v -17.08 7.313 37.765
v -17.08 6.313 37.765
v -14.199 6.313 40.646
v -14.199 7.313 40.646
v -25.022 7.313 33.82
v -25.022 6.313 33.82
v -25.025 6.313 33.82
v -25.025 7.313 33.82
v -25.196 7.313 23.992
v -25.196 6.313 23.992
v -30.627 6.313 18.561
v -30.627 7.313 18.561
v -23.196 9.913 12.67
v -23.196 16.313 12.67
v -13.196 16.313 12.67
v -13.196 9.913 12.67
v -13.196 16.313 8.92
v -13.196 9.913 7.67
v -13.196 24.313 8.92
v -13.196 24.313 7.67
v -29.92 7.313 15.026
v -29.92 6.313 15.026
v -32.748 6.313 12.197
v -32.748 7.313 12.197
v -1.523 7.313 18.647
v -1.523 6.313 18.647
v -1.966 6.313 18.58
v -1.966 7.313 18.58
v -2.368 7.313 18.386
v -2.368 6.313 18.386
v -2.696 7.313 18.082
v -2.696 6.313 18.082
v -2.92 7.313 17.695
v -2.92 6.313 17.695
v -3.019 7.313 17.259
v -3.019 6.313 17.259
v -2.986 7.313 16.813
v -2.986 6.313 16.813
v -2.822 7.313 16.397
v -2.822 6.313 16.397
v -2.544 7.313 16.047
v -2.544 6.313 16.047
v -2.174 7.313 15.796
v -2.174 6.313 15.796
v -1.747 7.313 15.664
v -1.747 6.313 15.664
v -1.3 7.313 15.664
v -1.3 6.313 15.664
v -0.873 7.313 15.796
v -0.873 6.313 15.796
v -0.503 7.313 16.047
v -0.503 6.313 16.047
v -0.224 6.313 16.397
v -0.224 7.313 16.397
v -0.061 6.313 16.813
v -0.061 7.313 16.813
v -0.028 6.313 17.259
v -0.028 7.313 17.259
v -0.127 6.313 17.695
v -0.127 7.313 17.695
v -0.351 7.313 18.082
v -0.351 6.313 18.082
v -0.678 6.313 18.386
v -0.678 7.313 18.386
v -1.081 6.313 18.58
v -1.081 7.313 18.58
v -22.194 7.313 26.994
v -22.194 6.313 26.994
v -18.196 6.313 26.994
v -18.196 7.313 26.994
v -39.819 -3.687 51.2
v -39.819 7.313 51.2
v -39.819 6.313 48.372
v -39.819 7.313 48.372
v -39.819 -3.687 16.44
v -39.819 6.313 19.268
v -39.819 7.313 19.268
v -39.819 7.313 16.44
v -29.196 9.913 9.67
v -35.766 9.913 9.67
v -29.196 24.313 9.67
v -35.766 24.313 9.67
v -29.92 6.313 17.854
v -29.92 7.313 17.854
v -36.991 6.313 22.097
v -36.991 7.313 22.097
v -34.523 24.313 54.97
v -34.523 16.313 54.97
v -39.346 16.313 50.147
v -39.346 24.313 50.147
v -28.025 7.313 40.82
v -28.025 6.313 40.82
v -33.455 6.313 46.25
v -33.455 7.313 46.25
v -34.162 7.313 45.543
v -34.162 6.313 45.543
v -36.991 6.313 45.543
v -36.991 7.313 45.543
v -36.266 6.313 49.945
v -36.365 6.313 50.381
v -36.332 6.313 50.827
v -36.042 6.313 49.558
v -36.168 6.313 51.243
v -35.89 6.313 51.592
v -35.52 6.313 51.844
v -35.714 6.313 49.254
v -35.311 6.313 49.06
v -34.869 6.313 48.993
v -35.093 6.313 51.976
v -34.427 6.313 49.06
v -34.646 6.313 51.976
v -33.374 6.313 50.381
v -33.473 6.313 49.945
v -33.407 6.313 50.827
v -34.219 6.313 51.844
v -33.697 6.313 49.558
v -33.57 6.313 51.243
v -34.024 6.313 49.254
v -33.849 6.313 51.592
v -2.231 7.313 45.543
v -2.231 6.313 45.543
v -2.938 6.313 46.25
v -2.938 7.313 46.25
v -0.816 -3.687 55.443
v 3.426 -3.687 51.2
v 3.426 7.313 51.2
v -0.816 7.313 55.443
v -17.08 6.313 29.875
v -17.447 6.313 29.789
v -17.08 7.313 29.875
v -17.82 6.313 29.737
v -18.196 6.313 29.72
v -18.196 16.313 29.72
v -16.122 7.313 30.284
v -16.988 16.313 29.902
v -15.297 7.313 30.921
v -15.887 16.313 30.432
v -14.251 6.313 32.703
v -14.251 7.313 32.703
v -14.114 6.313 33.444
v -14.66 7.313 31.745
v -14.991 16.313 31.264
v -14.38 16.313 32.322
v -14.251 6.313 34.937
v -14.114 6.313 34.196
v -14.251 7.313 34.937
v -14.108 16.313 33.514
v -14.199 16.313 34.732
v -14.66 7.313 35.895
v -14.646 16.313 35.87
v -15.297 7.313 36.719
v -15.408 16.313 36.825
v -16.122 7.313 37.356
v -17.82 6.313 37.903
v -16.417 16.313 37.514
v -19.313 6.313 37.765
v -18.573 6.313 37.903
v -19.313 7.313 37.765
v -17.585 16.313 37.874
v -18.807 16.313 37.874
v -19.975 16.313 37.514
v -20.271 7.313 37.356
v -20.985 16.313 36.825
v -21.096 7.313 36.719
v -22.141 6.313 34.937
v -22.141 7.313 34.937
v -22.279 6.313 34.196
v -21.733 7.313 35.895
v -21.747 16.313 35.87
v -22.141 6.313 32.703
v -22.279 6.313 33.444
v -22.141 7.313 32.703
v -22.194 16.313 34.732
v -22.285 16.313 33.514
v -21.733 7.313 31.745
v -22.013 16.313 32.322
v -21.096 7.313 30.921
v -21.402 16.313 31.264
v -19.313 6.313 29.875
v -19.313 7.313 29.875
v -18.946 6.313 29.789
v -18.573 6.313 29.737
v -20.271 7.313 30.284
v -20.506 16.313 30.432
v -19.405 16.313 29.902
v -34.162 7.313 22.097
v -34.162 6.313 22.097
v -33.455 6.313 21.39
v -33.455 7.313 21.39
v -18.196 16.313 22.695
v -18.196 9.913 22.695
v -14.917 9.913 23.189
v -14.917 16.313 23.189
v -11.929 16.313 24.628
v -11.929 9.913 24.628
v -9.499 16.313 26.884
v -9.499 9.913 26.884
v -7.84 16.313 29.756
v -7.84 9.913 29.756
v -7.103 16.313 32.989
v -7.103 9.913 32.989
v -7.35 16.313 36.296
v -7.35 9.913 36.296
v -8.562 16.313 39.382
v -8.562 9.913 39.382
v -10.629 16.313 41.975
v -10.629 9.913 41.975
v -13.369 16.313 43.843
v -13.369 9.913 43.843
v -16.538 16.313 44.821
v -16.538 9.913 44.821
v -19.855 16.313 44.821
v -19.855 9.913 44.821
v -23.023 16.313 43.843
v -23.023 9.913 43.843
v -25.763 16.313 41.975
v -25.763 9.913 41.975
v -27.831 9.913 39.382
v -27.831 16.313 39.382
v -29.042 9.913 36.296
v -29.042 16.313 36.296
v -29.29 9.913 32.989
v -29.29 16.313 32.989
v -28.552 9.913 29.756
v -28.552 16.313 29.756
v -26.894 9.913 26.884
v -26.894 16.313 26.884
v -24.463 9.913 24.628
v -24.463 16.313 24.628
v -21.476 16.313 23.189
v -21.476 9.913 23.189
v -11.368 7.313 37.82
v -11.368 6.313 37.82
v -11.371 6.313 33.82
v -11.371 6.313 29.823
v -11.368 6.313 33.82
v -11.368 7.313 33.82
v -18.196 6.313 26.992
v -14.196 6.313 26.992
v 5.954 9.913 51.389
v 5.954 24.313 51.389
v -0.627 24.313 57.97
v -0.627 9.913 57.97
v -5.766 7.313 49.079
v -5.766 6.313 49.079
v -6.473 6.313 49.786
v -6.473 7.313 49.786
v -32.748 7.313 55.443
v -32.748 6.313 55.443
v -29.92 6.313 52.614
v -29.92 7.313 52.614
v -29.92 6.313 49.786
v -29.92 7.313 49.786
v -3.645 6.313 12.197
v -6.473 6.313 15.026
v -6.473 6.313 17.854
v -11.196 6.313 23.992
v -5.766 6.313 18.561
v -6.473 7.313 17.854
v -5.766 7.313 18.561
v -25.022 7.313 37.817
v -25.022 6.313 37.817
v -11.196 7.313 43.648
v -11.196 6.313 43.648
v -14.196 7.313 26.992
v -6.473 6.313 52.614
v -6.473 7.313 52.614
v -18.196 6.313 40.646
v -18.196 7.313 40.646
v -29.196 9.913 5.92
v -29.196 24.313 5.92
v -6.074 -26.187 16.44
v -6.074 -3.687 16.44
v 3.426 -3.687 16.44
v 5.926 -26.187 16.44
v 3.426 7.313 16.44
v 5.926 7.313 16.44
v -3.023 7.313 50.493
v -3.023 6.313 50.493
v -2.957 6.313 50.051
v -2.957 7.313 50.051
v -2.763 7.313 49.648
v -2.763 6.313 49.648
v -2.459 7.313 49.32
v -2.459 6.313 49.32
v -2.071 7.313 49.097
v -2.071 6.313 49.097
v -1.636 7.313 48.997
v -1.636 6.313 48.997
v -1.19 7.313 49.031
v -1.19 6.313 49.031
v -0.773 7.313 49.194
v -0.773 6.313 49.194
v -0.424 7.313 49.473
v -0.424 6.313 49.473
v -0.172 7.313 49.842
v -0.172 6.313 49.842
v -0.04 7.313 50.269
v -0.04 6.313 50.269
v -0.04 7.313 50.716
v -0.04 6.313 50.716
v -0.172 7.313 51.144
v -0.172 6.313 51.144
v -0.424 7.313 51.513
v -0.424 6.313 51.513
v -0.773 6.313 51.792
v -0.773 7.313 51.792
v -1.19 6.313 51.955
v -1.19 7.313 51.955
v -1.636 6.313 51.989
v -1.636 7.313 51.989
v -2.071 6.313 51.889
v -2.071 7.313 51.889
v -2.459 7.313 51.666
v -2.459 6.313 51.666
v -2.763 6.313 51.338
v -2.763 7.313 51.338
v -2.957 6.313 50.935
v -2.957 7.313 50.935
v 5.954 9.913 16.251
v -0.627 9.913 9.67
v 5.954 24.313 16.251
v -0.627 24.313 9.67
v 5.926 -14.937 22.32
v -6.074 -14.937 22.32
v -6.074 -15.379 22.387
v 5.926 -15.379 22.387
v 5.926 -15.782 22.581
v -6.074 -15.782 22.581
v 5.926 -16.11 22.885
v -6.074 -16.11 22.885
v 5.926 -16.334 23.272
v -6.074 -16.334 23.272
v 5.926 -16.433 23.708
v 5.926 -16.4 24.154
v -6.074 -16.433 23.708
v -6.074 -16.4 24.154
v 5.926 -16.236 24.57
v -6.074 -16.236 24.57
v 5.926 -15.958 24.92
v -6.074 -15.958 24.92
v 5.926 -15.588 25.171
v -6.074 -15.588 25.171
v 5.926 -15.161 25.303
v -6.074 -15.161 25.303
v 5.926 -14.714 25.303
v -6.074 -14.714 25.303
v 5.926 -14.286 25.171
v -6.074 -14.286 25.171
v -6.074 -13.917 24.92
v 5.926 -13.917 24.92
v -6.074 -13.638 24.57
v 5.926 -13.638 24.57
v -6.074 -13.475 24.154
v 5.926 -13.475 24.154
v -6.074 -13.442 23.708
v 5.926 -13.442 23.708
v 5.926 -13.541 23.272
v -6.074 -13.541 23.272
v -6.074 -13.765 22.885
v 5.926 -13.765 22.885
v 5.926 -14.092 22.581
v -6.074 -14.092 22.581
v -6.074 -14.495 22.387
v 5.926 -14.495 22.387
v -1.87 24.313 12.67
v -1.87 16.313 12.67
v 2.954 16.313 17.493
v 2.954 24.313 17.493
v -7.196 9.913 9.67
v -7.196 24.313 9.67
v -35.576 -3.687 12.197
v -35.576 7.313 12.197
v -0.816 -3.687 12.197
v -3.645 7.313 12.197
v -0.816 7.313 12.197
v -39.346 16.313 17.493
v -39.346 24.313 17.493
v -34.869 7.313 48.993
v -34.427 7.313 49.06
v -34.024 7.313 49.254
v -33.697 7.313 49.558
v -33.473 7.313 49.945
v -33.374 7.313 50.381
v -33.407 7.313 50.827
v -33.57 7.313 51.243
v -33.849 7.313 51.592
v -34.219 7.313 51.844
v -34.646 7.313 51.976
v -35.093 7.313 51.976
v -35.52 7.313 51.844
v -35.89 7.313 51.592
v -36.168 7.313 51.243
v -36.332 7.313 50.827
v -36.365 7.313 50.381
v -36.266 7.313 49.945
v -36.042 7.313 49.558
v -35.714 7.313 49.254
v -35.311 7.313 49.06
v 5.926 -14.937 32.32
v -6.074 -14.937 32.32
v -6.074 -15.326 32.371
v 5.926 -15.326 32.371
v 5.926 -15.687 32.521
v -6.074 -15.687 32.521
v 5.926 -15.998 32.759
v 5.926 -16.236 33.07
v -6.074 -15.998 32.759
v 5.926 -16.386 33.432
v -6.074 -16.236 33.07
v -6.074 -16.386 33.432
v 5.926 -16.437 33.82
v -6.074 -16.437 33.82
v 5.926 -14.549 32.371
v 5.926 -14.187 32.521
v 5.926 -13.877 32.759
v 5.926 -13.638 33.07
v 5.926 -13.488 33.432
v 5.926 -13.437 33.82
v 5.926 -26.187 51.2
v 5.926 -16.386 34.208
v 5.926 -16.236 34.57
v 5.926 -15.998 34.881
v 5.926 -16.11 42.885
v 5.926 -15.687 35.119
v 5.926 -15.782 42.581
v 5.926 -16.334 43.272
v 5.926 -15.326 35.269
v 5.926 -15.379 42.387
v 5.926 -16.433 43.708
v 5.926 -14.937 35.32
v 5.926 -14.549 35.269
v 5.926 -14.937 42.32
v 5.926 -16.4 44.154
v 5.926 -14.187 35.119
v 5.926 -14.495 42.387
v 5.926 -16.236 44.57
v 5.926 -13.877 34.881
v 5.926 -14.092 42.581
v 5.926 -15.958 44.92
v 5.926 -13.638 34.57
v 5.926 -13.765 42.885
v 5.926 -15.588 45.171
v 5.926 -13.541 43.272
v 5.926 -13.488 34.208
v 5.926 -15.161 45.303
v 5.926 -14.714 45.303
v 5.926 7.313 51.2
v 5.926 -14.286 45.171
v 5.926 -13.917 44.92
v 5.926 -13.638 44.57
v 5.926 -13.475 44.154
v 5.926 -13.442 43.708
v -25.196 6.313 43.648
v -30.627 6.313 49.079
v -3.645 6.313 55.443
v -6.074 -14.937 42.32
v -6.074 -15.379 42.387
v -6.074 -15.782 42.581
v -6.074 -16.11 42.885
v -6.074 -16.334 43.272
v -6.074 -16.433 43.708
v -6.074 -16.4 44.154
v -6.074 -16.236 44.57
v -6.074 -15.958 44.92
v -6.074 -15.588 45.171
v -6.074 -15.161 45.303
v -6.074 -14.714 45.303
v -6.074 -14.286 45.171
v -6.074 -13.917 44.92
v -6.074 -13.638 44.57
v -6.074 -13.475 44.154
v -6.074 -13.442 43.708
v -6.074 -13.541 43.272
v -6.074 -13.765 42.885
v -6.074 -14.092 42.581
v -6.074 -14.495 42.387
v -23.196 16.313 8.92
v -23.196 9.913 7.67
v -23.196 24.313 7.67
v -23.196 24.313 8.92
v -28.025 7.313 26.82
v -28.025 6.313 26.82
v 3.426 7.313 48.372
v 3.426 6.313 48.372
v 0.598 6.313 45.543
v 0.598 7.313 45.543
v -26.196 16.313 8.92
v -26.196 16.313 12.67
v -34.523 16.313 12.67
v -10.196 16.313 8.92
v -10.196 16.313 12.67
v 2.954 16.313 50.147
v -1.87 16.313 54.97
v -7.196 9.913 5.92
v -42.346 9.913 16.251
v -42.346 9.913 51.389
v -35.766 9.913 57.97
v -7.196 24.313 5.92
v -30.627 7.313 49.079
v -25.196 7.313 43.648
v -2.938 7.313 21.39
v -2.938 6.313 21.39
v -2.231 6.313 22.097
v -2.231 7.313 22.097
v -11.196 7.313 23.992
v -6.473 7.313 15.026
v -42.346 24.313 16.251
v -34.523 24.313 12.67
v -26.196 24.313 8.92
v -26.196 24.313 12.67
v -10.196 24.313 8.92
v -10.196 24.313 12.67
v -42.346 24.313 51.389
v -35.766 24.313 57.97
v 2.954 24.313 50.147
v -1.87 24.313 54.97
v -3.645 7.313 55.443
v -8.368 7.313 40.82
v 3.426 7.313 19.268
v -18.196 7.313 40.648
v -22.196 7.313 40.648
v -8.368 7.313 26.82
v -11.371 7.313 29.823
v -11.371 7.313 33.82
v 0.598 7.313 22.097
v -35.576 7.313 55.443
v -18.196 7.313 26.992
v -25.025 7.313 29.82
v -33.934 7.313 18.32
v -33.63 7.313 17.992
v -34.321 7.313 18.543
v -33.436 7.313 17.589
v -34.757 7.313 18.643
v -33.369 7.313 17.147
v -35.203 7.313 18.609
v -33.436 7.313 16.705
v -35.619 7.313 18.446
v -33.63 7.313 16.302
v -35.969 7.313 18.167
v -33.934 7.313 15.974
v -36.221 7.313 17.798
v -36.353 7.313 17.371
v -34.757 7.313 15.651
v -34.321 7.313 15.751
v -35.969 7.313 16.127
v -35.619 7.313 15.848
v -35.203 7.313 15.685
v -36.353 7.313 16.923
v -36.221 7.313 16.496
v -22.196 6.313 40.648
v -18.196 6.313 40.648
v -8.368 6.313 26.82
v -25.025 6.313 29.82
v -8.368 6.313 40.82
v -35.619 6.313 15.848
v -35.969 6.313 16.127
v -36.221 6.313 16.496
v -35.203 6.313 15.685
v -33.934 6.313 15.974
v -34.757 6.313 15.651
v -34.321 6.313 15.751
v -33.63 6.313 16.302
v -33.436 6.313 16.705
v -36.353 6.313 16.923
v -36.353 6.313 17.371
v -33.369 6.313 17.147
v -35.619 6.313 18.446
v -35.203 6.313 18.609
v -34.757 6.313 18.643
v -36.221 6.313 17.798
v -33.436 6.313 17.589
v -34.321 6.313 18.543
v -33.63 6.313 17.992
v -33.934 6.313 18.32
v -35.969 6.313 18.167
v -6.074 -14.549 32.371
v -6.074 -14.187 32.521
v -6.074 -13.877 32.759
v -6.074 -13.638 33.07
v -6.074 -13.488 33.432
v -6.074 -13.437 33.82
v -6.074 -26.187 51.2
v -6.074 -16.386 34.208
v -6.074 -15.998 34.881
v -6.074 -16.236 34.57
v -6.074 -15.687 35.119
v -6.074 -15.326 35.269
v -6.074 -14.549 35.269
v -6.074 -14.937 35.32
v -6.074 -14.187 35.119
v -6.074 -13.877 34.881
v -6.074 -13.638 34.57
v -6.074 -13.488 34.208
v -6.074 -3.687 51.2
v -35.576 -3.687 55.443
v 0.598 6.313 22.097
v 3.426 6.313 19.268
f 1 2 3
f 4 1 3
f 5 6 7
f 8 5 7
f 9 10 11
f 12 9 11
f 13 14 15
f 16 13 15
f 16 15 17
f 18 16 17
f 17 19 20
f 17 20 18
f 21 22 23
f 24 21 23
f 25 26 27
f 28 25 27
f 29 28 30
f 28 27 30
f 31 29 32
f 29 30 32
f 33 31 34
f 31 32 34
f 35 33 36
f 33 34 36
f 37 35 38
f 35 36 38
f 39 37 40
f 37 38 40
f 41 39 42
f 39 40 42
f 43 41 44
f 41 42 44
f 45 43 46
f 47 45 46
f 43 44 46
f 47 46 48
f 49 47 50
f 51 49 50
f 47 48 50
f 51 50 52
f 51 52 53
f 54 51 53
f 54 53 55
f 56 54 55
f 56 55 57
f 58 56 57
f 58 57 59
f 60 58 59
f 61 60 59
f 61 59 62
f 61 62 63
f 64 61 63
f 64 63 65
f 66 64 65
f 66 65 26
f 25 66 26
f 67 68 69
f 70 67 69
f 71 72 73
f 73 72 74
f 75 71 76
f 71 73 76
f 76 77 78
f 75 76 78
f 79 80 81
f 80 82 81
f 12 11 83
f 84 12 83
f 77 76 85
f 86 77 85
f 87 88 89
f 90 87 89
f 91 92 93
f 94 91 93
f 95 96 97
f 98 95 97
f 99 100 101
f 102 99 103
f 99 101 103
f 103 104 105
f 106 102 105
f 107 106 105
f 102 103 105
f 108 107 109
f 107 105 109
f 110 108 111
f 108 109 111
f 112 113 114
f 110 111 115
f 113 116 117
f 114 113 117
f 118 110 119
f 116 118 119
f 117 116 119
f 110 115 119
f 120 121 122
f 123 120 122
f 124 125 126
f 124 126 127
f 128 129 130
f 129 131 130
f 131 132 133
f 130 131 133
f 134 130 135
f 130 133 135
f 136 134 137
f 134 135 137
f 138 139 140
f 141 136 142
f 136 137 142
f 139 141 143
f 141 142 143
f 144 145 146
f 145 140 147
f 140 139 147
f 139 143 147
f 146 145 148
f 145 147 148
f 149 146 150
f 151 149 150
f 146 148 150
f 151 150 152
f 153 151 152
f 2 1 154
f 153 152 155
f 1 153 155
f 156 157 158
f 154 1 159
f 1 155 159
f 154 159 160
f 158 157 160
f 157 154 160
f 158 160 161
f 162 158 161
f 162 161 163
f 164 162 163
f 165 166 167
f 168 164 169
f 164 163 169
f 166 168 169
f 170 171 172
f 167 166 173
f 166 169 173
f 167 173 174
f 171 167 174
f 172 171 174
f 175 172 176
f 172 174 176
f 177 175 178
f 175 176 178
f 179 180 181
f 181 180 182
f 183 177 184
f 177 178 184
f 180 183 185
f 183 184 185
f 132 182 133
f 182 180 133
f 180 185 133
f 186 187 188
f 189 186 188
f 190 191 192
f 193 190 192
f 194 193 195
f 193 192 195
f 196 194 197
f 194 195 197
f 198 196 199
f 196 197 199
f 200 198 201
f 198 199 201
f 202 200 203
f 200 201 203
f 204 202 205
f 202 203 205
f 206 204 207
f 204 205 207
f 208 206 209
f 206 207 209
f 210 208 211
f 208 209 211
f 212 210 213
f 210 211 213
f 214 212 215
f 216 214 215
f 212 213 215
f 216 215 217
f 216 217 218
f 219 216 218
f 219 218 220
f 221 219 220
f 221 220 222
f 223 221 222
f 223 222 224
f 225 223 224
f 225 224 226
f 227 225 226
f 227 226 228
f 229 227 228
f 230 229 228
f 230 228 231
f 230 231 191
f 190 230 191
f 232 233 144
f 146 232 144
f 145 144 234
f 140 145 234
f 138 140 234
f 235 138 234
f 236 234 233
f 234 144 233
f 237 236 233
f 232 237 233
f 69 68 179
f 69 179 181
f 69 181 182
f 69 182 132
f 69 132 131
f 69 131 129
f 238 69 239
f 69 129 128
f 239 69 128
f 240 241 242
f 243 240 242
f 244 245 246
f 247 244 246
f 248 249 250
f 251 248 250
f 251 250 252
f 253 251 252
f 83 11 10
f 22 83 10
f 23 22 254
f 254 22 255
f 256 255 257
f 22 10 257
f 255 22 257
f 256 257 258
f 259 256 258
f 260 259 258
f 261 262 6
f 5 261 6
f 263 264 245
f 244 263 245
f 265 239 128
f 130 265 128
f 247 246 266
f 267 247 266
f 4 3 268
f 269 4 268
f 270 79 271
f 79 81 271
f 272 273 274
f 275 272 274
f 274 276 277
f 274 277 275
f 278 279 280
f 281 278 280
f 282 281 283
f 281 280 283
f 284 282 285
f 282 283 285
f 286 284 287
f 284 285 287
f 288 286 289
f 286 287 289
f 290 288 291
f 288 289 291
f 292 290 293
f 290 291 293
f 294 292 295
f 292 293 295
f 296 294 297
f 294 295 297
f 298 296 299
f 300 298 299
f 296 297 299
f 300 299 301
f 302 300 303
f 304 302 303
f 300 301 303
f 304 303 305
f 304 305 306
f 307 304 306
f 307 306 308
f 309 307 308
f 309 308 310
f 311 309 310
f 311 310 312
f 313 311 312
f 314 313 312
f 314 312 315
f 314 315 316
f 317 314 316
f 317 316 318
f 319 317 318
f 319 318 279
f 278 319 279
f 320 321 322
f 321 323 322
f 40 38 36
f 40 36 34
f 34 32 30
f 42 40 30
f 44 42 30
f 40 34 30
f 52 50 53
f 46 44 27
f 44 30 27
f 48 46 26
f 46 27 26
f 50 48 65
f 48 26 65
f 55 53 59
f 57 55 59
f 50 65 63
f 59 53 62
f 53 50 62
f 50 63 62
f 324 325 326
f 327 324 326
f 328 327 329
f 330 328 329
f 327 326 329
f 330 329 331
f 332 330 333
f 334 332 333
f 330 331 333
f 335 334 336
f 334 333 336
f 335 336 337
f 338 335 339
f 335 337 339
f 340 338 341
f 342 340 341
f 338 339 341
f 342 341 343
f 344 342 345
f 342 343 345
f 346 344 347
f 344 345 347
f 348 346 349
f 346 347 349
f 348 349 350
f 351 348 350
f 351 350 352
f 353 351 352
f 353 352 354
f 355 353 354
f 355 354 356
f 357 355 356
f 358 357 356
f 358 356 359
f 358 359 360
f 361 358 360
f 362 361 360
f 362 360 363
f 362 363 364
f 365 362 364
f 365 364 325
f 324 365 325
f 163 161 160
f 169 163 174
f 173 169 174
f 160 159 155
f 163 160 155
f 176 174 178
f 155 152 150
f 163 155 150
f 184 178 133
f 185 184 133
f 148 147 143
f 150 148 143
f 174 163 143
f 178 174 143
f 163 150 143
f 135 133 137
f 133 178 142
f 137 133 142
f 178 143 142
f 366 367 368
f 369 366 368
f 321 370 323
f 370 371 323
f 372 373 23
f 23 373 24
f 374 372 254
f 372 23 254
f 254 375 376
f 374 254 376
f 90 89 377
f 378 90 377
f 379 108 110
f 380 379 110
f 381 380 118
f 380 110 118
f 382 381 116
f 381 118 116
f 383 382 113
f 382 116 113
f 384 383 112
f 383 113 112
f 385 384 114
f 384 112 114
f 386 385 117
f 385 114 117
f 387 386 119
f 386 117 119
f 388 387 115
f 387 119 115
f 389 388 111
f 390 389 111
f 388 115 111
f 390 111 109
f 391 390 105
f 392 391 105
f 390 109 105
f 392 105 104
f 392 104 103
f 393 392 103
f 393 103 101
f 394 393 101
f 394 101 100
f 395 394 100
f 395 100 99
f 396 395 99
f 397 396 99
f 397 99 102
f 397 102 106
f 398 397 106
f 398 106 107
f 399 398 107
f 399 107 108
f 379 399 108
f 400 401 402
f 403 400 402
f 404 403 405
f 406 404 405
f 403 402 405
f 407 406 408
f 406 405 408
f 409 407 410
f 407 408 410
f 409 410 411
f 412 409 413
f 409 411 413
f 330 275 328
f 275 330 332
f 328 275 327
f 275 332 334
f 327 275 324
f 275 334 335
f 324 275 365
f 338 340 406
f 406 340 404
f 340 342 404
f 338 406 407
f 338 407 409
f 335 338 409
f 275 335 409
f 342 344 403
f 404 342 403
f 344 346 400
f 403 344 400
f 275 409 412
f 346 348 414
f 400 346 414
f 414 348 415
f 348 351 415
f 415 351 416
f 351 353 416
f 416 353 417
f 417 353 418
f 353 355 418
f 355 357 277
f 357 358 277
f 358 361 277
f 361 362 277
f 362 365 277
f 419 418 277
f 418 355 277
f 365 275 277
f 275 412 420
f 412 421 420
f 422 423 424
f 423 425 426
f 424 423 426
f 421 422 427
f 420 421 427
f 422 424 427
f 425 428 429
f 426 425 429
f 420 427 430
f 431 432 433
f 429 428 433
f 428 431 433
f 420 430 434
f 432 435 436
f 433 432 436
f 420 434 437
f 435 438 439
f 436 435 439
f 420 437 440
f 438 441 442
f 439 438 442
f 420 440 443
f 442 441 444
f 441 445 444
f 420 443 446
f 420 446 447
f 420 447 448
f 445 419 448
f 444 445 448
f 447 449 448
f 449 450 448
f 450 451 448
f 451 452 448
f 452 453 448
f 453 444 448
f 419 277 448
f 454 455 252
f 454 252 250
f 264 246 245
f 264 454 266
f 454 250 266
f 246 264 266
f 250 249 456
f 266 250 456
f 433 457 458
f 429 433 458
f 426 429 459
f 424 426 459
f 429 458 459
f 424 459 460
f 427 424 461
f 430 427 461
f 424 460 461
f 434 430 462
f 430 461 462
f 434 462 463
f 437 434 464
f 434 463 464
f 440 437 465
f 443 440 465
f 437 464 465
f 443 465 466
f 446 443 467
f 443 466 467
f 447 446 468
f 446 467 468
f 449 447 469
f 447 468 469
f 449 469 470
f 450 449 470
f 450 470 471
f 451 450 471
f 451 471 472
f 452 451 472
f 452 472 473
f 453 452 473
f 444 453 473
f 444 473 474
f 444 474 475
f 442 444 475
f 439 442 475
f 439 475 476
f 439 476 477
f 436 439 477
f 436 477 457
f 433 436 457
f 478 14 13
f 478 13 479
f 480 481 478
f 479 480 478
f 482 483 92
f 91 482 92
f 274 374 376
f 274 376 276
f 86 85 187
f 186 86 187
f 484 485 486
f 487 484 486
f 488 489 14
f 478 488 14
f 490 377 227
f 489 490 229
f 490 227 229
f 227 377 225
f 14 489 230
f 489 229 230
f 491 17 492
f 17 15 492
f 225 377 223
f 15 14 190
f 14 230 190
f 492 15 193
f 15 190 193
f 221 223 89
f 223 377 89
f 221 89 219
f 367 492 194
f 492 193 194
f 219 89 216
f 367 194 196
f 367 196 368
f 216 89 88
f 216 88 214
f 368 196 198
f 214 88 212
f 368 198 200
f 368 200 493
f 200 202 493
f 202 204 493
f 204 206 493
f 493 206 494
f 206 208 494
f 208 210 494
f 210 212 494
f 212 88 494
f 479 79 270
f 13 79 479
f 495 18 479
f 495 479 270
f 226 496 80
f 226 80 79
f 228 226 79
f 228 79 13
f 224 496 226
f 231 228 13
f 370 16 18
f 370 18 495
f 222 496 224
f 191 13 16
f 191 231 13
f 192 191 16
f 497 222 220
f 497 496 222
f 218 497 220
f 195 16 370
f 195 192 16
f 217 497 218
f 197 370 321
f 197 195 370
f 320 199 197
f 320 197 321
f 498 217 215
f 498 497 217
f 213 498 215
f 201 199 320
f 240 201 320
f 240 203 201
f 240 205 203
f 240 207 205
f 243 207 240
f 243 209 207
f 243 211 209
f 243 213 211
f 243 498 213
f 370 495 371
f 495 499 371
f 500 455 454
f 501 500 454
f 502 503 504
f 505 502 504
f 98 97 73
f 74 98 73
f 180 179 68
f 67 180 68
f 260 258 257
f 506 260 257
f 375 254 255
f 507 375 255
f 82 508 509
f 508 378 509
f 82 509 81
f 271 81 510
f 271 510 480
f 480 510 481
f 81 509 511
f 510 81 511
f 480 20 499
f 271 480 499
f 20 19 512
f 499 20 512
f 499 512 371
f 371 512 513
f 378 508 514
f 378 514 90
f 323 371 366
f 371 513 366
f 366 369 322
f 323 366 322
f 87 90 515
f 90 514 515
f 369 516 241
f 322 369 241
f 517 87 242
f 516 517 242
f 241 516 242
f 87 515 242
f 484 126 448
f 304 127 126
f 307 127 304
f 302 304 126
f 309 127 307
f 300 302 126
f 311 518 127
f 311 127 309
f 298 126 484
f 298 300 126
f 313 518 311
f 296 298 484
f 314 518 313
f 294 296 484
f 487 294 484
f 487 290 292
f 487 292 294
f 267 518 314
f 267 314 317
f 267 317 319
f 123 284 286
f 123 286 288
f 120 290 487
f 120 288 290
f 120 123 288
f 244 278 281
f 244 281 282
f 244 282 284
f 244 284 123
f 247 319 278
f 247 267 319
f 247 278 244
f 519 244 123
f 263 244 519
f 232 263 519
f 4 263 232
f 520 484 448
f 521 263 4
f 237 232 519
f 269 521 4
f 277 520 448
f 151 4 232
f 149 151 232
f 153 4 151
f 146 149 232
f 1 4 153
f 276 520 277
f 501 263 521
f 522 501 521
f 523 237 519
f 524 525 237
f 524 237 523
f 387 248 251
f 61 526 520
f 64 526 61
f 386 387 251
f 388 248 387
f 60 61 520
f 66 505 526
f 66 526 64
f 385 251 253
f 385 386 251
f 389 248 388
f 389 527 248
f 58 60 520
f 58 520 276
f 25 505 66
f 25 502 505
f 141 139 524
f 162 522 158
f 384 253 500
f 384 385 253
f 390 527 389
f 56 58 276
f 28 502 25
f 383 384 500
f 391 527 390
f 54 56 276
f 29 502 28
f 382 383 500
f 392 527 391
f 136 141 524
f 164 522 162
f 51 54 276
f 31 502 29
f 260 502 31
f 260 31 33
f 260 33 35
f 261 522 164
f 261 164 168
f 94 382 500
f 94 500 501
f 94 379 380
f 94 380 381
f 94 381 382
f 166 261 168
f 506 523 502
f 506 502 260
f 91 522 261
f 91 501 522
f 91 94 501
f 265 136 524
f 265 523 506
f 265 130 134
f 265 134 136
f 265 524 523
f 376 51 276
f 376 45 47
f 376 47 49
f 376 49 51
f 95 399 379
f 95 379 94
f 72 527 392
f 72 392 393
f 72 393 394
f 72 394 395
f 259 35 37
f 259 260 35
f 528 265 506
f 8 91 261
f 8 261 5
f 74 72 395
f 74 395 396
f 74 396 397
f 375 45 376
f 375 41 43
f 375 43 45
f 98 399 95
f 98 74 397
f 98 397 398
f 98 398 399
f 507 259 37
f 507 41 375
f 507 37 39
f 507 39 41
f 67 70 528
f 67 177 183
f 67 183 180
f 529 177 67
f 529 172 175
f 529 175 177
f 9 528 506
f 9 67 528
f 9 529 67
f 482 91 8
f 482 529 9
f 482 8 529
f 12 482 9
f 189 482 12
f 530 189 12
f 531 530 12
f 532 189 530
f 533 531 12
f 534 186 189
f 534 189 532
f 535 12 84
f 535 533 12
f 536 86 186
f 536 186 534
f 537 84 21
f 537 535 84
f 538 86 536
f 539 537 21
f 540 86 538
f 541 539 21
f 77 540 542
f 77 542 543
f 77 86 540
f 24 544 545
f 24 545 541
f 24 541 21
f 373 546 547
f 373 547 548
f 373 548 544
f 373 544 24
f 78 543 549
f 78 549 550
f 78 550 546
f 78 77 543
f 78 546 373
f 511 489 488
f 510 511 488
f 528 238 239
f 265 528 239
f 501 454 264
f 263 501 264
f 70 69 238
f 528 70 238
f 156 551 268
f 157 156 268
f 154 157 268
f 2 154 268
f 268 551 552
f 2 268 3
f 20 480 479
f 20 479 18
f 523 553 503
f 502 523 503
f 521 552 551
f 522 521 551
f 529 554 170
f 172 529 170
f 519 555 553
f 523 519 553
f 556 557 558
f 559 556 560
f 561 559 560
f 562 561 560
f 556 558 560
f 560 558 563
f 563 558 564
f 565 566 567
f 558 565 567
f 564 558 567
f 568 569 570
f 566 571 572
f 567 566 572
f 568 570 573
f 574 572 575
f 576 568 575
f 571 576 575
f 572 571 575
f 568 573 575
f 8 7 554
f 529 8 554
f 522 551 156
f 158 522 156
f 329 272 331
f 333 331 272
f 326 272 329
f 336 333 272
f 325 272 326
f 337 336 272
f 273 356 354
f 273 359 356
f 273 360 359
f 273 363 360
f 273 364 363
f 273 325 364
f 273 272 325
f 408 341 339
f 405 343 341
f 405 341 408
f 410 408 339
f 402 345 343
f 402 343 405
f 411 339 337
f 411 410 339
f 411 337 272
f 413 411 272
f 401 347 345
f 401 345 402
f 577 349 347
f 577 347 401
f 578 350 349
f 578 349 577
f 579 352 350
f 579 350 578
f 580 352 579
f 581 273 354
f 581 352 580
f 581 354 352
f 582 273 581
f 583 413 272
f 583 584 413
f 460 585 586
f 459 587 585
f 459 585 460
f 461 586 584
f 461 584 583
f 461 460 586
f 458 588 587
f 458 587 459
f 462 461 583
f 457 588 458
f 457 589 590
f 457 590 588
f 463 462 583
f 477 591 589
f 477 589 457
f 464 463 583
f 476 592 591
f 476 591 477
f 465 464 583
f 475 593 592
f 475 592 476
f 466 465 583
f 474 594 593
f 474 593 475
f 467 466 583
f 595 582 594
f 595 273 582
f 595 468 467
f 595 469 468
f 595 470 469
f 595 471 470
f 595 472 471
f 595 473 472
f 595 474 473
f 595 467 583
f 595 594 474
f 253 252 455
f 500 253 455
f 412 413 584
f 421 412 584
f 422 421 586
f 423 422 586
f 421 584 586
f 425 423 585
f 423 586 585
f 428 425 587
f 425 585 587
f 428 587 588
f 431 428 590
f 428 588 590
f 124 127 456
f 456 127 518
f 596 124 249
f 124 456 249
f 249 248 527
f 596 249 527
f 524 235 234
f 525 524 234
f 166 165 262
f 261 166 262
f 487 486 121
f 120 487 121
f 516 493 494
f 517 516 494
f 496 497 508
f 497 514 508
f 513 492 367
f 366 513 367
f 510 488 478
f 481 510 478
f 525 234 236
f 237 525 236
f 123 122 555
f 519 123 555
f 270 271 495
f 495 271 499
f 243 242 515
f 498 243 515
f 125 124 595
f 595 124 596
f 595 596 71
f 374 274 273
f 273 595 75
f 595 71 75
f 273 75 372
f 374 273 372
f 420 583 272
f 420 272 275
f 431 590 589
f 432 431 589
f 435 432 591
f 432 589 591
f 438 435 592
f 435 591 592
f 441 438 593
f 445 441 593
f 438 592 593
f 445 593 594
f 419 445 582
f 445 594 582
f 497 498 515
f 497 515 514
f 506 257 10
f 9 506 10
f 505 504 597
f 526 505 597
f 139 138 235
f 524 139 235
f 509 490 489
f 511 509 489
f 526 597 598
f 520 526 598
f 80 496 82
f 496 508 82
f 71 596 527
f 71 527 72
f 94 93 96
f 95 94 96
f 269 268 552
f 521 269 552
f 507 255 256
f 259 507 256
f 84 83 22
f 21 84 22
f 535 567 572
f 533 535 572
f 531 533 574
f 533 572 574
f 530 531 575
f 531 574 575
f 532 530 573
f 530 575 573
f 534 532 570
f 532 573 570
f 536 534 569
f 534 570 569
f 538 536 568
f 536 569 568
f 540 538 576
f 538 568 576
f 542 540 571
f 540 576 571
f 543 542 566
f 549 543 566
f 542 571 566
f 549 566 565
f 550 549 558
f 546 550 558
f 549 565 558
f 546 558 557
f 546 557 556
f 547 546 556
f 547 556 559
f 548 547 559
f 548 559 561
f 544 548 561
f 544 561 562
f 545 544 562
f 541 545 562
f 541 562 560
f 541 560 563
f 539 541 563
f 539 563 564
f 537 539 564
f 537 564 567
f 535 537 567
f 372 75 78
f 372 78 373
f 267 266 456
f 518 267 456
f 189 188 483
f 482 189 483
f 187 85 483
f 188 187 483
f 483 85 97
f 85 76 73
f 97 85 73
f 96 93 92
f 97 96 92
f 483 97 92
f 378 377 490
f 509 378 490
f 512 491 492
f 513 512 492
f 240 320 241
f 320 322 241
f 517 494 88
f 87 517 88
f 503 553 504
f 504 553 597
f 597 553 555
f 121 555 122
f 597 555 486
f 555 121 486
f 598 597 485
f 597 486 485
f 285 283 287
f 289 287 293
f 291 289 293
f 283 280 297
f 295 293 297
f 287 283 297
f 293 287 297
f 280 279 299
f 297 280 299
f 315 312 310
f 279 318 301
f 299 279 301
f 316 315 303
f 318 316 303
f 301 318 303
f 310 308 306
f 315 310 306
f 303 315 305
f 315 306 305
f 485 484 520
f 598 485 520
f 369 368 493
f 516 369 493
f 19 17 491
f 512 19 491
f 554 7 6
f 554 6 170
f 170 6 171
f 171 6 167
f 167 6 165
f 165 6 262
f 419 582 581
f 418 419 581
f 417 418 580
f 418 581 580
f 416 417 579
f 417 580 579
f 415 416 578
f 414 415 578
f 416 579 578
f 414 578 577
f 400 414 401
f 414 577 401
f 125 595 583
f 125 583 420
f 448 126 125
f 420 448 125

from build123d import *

# Parameters (mm, degrees)
BOSS_EXTRUDE1_DEPTH      = 8
BOSS_EXTRUDE2_DEPTH      = 6.4
SKETCH4_R                = 11.125
CUT_EXTRUDE1_DEPTH       = 13
SKETCH5_R                = 4.1
BOSS_EXTRUDE3_DEPTH      = 13
SKETCH6_R                = 1.5
BOSS_EXTRUDE4_DEPTH      = 4
CIRPATTERN2_COUNT        = 4
SKETCH8_W                = 10
SKETCH8_H                = 5
CUT_EXTRUDE2_DEPTH       = 19
BOSS_EXTRUDE5_DEPTH      = 7
BOSS_EXTRUDE5_DEPTH_BACK = 3
SKETCH10_W               = 34.760105104
SKETCH10_H               = 11
BOSS_EXTRUDE6_DEPTH      = 2.5
SKETCH11_W               = 12
SKETCH11_H               = 34.760105104
BOSS_EXTRUDE7_DEPTH      = 22.5
CUT_EXTRUDE3_DEPTH       = 22.5


with BuildPart() as part:
    # Sketch1 → Boss-Extrude1 (new body)
    with BuildSketch(Plane.XZ.offset(-16.312689454)):
        Polygon((-42.346407377, 51.389271206), (-42.346407377, 16.250671026), (-35.765707467, 9.669971116), (-29.196407377, 9.669971116), (-29.196407377, 5.919971116), (-7.196407377, 5.919971116), (-7.196407377, 9.669971116), (-0.627107287, 9.669971116), (5.953592623, 16.250671026), (5.953592623, 51.389271206), (-0.627107287, 57.969971116), (-35.765707467, 57.969971116), align=None)
        Polygon((-10.196407377, 12.669971116), (-1.869747974, 12.669971116), (2.953592623, 17.493311713), (2.953592623, 50.146630519), (-1.869747974, 54.969971116), (-34.52306678, 54.969971116), (-39.346407377, 50.146630519), (-39.346407377, 17.493311713), (-34.52306678, 12.669971116), (-26.196407377, 12.669971116), (-26.196407377, 8.919971116), (-10.196407377, 8.919971116), align=None, mode=Mode.SUBTRACT)
    extrude(amount=-BOSS_EXTRUDE1_DEPTH)

    # Sketch3 → Boss-Extrude2 (add)
    with BuildSketch(Plane.XZ.offset(-16.312689454)):
        Polygon((-35.765707467, 57.969971116), (-42.346407377, 51.389271206), (-42.346407377, 16.250671026), (-35.765707467, 9.669971116), (-29.196407377, 9.669971116), (-29.196407377, 5.919971116), (-7.196407377, 5.919971116), (-7.196407377, 9.669971116), (-0.627107287, 9.669971116), (5.953592623, 16.250671026), (5.953592623, 51.389271206), (-0.627107287, 57.969971116), align=None)
    extrude(amount=BOSS_EXTRUDE2_DEPTH)

    # Sketch4 → Cut-Extrude1 (cut)
    with BuildSketch(Plane.XZ.offset(-9.912689454)):
        with Locations(Location((-18.196407377, 33.819971116, 0), (0, 0, 270))):
            Circle(SKETCH4_R)
    extrude(amount=-CUT_EXTRUDE1_DEPTH, mode=Mode.SUBTRACT)

    # Sketch8 → Cut-Extrude2 (cut)
    with BuildSketch(Plane(origin=(0, 24.312689454, 0), x_dir=(1, 0, 0), z_dir=(0, 1, 0))):
        with Locations((-18.196407377, -10.169971116)):
            Rectangle(SKETCH8_W, SKETCH8_H)
    extrude(amount=-CUT_EXTRUDE2_DEPTH, mode=Mode.SUBTRACT)


with BuildPart() as body_2:
    # Sketch5 → Boss-Extrude3 (new body)
    with BuildSketch(Plane.XZ.offset(-16.312689454)):
        with Locations(Location((-18.196407377, 33.819971116, 0), (0, 0, 270))):
            Circle(SKETCH5_R)
    extrude(amount=BOSS_EXTRUDE3_DEPTH)

    # Sketch6 → Boss-Extrude4 (add)
    with BuildSketch(Plane.XZ.offset(-3.312689454)):
        with BuildLine():
            Line((-22.141431086, 34.9365677), (-25.022114558, 37.817251172))
            Line((-25.022114558, 37.817251172), (-25.022114558, 33.819971116))
            Line((-25.022114558, 33.819971116), (-28.024834502, 33.819971116))
            Line((-28.024834502, 33.819971116), (-28.024834502, 40.819971116))
            Line((-28.024834502, 40.819971116), (-33.455139585, 46.250276199))
            Line((-33.455139585, 46.250276199), (-34.162246366, 45.543169418))
            Line((-34.162246366, 45.543169418), (-36.990673491, 45.543169418))
            Line((-36.990673491, 45.543169418), (-39.819100616, 48.371596543))
            Line((-39.819100616, 48.371596543), (-39.819100616, 51.200023668))
            Line((-39.819100616, 51.200023668), (-35.576459929, 55.442664355))
            Line((-35.576459929, 55.442664355), (-32.748032804, 55.442664355))
            Line((-32.748032804, 55.442664355), (-29.919605679, 52.61423723))
            Line((-29.919605679, 52.61423723), (-29.919605679, 49.785810105))
            Line((-29.919605679, 49.785810105), (-30.626712461, 49.078703324))
            Line((-30.626712461, 49.078703324), (-25.196407377, 43.648398241))
            Line((-25.196407377, 43.648398241), (-18.196407377, 43.648398241))
            Line((-18.196407377, 43.648398241), (-18.196407377, 40.648398241))
            Line((-18.196407377, 40.648398241), (-22.196407377, 40.648398241))
            Line((-22.196407377, 40.648398241), (-19.313003962, 37.764994825))
            ThreePointArc((-19.313003962, 37.764994825), (-21.09554518, 36.719108919), (-22.141431086, 34.9365677))
        make_face()
        with Locations(Location((-34.869353148, 50.492916887, 0), (0, 0, 270))):
            Circle(SKETCH6_R, mode=Mode.SUBTRACT)
    boss_extrude4 = extrude(amount=-BOSS_EXTRUDE4_DEPTH)

    # CirPattern2: Boss-Extrude4 ×4 about axis
    cirpattern2_axis = Axis((-18.196407377, 0, 33.819971116), (0, 1, 0))
    for i in range(1, CIRPATTERN2_COUNT):
        add(boss_extrude4.rotate(cirpattern2_axis, i * 360 / CIRPATTERN2_COUNT))

    # Sketch9 → Boss-Extrude5 (add, two sides: drawn at the far end of the back side and taken through both)
    with BuildSketch(Plane.XZ.offset(-3.312689454).offset(-BOSS_EXTRUDE5_DEPTH_BACK)):
        Polygon((-32.748032804, 12.197277877), (-3.64478195, 12.197277877), (-0.816354825, 12.197277877), (3.426285862, 16.439918564), (3.426285862, 19.268345689), (3.426285862, 48.371596543), (3.426285862, 51.200023668), (-0.816354825, 55.442664355), (-3.64478195, 55.442664355), (-32.748032804, 55.442664355), (-35.576459929, 55.442664355), (-39.819100616, 51.200023668), (-39.819100616, 48.371596543), (-39.819100616, 19.268345689), (-39.819100616, 16.439918564), (-35.576459929, 12.197277877), align=None)
    extrude(amount=BOSS_EXTRUDE5_DEPTH + BOSS_EXTRUDE5_DEPTH_BACK)

    # Sketch10 → Boss-Extrude6 (add)
    with BuildSketch(Plane(origin=(3.426285862, 0, 0), x_dir=(0, 0, -1), z_dir=(1, 0, 0))):
        with Locations((-33.819971116, 1.812689454)):
            Rectangle(SKETCH10_W, SKETCH10_H)
    extrude(amount=BOSS_EXTRUDE6_DEPTH)

    # Sketch11 → Boss-Extrude7 (add)
    with BuildSketch(Plane.XZ.offset(3.687310546)):
        with Locations((-0.073714138, 33.819971116)):
            Rectangle(SKETCH11_W, SKETCH11_H)
    extrude(amount=BOSS_EXTRUDE7_DEPTH)

    # Sketch12 → Cut-Extrude3 (cut)
    with BuildSketch(Plane.ZY.offset(6.073714138)):
        with BuildLine():
            ThreePointArc((33.819971116, -13.437310546), (32.759310944, -13.876650374), (32.319971116, -14.937310546))
            Line((32.319971116, -14.937310546), (33.819971116, -14.937310546))
            Line((33.819971116, -14.937310546), (33.819971116, -13.437310546))
        make_face()
        with BuildLine():
            Line((33.819971116, -14.937310546), (32.319971116, -14.937310546))
            ThreePointArc((32.319971116, -14.937310546), (32.759310944, -15.997970718), (33.819971116, -16.437310546))
            Line((33.819971116, -16.437310546), (33.819971116, -14.937310546))
        make_face()
        with BuildLine():
            Line((33.819971116, -13.437310546), (33.819971116, -14.937310546))
            Line((33.819971116, -14.937310546), (35.319971116, -14.937310546))
            ThreePointArc((35.319971116, -14.937310546), (34.880631288, -13.876650374), (33.819971116, -13.437310546))
        make_face()
        with BuildLine():
            Line((35.319971116, -14.937310546), (33.819971116, -14.937310546))
            Line((33.819971116, -14.937310546), (33.819971116, -16.437310546))
            ThreePointArc((33.819971116, -16.437310546), (34.880631288, -15.997970718), (35.319971116, -14.937310546))
        make_face()
        with BuildLine():
            ThreePointArc((45.319971116, -14.937310546), (43.819971116, -13.437310546), (42.319971116, -14.937310546))
            Line((42.319971116, -14.937310546), (45.319971116, -14.937310546))
        make_face()
        with BuildLine():
            Line((45.319971116, -14.937310546), (42.319971116, -14.937310546))
            ThreePointArc((42.319971116, -14.937310546), (43.819971116, -16.437310546), (45.319971116, -14.937310546))
        make_face()
        with BuildLine():
            ThreePointArc((25.319971116, -14.937310546), (23.819971116, -13.437310546), (22.319971116, -14.937310546))
            Line((22.319971116, -14.937310546), (25.319971116, -14.937310546))
        make_face()
        with BuildLine():
            Line((25.319971116, -14.937310546), (22.319971116, -14.937310546))
            ThreePointArc((22.319971116, -14.937310546), (23.819971116, -16.437310546), (25.319971116, -14.937310546))
        make_face()
    extrude(amount=-CUT_EXTRUDE3_DEPTH, mode=Mode.SUBTRACT)


solid = Compound([part.part, body_2.part])
